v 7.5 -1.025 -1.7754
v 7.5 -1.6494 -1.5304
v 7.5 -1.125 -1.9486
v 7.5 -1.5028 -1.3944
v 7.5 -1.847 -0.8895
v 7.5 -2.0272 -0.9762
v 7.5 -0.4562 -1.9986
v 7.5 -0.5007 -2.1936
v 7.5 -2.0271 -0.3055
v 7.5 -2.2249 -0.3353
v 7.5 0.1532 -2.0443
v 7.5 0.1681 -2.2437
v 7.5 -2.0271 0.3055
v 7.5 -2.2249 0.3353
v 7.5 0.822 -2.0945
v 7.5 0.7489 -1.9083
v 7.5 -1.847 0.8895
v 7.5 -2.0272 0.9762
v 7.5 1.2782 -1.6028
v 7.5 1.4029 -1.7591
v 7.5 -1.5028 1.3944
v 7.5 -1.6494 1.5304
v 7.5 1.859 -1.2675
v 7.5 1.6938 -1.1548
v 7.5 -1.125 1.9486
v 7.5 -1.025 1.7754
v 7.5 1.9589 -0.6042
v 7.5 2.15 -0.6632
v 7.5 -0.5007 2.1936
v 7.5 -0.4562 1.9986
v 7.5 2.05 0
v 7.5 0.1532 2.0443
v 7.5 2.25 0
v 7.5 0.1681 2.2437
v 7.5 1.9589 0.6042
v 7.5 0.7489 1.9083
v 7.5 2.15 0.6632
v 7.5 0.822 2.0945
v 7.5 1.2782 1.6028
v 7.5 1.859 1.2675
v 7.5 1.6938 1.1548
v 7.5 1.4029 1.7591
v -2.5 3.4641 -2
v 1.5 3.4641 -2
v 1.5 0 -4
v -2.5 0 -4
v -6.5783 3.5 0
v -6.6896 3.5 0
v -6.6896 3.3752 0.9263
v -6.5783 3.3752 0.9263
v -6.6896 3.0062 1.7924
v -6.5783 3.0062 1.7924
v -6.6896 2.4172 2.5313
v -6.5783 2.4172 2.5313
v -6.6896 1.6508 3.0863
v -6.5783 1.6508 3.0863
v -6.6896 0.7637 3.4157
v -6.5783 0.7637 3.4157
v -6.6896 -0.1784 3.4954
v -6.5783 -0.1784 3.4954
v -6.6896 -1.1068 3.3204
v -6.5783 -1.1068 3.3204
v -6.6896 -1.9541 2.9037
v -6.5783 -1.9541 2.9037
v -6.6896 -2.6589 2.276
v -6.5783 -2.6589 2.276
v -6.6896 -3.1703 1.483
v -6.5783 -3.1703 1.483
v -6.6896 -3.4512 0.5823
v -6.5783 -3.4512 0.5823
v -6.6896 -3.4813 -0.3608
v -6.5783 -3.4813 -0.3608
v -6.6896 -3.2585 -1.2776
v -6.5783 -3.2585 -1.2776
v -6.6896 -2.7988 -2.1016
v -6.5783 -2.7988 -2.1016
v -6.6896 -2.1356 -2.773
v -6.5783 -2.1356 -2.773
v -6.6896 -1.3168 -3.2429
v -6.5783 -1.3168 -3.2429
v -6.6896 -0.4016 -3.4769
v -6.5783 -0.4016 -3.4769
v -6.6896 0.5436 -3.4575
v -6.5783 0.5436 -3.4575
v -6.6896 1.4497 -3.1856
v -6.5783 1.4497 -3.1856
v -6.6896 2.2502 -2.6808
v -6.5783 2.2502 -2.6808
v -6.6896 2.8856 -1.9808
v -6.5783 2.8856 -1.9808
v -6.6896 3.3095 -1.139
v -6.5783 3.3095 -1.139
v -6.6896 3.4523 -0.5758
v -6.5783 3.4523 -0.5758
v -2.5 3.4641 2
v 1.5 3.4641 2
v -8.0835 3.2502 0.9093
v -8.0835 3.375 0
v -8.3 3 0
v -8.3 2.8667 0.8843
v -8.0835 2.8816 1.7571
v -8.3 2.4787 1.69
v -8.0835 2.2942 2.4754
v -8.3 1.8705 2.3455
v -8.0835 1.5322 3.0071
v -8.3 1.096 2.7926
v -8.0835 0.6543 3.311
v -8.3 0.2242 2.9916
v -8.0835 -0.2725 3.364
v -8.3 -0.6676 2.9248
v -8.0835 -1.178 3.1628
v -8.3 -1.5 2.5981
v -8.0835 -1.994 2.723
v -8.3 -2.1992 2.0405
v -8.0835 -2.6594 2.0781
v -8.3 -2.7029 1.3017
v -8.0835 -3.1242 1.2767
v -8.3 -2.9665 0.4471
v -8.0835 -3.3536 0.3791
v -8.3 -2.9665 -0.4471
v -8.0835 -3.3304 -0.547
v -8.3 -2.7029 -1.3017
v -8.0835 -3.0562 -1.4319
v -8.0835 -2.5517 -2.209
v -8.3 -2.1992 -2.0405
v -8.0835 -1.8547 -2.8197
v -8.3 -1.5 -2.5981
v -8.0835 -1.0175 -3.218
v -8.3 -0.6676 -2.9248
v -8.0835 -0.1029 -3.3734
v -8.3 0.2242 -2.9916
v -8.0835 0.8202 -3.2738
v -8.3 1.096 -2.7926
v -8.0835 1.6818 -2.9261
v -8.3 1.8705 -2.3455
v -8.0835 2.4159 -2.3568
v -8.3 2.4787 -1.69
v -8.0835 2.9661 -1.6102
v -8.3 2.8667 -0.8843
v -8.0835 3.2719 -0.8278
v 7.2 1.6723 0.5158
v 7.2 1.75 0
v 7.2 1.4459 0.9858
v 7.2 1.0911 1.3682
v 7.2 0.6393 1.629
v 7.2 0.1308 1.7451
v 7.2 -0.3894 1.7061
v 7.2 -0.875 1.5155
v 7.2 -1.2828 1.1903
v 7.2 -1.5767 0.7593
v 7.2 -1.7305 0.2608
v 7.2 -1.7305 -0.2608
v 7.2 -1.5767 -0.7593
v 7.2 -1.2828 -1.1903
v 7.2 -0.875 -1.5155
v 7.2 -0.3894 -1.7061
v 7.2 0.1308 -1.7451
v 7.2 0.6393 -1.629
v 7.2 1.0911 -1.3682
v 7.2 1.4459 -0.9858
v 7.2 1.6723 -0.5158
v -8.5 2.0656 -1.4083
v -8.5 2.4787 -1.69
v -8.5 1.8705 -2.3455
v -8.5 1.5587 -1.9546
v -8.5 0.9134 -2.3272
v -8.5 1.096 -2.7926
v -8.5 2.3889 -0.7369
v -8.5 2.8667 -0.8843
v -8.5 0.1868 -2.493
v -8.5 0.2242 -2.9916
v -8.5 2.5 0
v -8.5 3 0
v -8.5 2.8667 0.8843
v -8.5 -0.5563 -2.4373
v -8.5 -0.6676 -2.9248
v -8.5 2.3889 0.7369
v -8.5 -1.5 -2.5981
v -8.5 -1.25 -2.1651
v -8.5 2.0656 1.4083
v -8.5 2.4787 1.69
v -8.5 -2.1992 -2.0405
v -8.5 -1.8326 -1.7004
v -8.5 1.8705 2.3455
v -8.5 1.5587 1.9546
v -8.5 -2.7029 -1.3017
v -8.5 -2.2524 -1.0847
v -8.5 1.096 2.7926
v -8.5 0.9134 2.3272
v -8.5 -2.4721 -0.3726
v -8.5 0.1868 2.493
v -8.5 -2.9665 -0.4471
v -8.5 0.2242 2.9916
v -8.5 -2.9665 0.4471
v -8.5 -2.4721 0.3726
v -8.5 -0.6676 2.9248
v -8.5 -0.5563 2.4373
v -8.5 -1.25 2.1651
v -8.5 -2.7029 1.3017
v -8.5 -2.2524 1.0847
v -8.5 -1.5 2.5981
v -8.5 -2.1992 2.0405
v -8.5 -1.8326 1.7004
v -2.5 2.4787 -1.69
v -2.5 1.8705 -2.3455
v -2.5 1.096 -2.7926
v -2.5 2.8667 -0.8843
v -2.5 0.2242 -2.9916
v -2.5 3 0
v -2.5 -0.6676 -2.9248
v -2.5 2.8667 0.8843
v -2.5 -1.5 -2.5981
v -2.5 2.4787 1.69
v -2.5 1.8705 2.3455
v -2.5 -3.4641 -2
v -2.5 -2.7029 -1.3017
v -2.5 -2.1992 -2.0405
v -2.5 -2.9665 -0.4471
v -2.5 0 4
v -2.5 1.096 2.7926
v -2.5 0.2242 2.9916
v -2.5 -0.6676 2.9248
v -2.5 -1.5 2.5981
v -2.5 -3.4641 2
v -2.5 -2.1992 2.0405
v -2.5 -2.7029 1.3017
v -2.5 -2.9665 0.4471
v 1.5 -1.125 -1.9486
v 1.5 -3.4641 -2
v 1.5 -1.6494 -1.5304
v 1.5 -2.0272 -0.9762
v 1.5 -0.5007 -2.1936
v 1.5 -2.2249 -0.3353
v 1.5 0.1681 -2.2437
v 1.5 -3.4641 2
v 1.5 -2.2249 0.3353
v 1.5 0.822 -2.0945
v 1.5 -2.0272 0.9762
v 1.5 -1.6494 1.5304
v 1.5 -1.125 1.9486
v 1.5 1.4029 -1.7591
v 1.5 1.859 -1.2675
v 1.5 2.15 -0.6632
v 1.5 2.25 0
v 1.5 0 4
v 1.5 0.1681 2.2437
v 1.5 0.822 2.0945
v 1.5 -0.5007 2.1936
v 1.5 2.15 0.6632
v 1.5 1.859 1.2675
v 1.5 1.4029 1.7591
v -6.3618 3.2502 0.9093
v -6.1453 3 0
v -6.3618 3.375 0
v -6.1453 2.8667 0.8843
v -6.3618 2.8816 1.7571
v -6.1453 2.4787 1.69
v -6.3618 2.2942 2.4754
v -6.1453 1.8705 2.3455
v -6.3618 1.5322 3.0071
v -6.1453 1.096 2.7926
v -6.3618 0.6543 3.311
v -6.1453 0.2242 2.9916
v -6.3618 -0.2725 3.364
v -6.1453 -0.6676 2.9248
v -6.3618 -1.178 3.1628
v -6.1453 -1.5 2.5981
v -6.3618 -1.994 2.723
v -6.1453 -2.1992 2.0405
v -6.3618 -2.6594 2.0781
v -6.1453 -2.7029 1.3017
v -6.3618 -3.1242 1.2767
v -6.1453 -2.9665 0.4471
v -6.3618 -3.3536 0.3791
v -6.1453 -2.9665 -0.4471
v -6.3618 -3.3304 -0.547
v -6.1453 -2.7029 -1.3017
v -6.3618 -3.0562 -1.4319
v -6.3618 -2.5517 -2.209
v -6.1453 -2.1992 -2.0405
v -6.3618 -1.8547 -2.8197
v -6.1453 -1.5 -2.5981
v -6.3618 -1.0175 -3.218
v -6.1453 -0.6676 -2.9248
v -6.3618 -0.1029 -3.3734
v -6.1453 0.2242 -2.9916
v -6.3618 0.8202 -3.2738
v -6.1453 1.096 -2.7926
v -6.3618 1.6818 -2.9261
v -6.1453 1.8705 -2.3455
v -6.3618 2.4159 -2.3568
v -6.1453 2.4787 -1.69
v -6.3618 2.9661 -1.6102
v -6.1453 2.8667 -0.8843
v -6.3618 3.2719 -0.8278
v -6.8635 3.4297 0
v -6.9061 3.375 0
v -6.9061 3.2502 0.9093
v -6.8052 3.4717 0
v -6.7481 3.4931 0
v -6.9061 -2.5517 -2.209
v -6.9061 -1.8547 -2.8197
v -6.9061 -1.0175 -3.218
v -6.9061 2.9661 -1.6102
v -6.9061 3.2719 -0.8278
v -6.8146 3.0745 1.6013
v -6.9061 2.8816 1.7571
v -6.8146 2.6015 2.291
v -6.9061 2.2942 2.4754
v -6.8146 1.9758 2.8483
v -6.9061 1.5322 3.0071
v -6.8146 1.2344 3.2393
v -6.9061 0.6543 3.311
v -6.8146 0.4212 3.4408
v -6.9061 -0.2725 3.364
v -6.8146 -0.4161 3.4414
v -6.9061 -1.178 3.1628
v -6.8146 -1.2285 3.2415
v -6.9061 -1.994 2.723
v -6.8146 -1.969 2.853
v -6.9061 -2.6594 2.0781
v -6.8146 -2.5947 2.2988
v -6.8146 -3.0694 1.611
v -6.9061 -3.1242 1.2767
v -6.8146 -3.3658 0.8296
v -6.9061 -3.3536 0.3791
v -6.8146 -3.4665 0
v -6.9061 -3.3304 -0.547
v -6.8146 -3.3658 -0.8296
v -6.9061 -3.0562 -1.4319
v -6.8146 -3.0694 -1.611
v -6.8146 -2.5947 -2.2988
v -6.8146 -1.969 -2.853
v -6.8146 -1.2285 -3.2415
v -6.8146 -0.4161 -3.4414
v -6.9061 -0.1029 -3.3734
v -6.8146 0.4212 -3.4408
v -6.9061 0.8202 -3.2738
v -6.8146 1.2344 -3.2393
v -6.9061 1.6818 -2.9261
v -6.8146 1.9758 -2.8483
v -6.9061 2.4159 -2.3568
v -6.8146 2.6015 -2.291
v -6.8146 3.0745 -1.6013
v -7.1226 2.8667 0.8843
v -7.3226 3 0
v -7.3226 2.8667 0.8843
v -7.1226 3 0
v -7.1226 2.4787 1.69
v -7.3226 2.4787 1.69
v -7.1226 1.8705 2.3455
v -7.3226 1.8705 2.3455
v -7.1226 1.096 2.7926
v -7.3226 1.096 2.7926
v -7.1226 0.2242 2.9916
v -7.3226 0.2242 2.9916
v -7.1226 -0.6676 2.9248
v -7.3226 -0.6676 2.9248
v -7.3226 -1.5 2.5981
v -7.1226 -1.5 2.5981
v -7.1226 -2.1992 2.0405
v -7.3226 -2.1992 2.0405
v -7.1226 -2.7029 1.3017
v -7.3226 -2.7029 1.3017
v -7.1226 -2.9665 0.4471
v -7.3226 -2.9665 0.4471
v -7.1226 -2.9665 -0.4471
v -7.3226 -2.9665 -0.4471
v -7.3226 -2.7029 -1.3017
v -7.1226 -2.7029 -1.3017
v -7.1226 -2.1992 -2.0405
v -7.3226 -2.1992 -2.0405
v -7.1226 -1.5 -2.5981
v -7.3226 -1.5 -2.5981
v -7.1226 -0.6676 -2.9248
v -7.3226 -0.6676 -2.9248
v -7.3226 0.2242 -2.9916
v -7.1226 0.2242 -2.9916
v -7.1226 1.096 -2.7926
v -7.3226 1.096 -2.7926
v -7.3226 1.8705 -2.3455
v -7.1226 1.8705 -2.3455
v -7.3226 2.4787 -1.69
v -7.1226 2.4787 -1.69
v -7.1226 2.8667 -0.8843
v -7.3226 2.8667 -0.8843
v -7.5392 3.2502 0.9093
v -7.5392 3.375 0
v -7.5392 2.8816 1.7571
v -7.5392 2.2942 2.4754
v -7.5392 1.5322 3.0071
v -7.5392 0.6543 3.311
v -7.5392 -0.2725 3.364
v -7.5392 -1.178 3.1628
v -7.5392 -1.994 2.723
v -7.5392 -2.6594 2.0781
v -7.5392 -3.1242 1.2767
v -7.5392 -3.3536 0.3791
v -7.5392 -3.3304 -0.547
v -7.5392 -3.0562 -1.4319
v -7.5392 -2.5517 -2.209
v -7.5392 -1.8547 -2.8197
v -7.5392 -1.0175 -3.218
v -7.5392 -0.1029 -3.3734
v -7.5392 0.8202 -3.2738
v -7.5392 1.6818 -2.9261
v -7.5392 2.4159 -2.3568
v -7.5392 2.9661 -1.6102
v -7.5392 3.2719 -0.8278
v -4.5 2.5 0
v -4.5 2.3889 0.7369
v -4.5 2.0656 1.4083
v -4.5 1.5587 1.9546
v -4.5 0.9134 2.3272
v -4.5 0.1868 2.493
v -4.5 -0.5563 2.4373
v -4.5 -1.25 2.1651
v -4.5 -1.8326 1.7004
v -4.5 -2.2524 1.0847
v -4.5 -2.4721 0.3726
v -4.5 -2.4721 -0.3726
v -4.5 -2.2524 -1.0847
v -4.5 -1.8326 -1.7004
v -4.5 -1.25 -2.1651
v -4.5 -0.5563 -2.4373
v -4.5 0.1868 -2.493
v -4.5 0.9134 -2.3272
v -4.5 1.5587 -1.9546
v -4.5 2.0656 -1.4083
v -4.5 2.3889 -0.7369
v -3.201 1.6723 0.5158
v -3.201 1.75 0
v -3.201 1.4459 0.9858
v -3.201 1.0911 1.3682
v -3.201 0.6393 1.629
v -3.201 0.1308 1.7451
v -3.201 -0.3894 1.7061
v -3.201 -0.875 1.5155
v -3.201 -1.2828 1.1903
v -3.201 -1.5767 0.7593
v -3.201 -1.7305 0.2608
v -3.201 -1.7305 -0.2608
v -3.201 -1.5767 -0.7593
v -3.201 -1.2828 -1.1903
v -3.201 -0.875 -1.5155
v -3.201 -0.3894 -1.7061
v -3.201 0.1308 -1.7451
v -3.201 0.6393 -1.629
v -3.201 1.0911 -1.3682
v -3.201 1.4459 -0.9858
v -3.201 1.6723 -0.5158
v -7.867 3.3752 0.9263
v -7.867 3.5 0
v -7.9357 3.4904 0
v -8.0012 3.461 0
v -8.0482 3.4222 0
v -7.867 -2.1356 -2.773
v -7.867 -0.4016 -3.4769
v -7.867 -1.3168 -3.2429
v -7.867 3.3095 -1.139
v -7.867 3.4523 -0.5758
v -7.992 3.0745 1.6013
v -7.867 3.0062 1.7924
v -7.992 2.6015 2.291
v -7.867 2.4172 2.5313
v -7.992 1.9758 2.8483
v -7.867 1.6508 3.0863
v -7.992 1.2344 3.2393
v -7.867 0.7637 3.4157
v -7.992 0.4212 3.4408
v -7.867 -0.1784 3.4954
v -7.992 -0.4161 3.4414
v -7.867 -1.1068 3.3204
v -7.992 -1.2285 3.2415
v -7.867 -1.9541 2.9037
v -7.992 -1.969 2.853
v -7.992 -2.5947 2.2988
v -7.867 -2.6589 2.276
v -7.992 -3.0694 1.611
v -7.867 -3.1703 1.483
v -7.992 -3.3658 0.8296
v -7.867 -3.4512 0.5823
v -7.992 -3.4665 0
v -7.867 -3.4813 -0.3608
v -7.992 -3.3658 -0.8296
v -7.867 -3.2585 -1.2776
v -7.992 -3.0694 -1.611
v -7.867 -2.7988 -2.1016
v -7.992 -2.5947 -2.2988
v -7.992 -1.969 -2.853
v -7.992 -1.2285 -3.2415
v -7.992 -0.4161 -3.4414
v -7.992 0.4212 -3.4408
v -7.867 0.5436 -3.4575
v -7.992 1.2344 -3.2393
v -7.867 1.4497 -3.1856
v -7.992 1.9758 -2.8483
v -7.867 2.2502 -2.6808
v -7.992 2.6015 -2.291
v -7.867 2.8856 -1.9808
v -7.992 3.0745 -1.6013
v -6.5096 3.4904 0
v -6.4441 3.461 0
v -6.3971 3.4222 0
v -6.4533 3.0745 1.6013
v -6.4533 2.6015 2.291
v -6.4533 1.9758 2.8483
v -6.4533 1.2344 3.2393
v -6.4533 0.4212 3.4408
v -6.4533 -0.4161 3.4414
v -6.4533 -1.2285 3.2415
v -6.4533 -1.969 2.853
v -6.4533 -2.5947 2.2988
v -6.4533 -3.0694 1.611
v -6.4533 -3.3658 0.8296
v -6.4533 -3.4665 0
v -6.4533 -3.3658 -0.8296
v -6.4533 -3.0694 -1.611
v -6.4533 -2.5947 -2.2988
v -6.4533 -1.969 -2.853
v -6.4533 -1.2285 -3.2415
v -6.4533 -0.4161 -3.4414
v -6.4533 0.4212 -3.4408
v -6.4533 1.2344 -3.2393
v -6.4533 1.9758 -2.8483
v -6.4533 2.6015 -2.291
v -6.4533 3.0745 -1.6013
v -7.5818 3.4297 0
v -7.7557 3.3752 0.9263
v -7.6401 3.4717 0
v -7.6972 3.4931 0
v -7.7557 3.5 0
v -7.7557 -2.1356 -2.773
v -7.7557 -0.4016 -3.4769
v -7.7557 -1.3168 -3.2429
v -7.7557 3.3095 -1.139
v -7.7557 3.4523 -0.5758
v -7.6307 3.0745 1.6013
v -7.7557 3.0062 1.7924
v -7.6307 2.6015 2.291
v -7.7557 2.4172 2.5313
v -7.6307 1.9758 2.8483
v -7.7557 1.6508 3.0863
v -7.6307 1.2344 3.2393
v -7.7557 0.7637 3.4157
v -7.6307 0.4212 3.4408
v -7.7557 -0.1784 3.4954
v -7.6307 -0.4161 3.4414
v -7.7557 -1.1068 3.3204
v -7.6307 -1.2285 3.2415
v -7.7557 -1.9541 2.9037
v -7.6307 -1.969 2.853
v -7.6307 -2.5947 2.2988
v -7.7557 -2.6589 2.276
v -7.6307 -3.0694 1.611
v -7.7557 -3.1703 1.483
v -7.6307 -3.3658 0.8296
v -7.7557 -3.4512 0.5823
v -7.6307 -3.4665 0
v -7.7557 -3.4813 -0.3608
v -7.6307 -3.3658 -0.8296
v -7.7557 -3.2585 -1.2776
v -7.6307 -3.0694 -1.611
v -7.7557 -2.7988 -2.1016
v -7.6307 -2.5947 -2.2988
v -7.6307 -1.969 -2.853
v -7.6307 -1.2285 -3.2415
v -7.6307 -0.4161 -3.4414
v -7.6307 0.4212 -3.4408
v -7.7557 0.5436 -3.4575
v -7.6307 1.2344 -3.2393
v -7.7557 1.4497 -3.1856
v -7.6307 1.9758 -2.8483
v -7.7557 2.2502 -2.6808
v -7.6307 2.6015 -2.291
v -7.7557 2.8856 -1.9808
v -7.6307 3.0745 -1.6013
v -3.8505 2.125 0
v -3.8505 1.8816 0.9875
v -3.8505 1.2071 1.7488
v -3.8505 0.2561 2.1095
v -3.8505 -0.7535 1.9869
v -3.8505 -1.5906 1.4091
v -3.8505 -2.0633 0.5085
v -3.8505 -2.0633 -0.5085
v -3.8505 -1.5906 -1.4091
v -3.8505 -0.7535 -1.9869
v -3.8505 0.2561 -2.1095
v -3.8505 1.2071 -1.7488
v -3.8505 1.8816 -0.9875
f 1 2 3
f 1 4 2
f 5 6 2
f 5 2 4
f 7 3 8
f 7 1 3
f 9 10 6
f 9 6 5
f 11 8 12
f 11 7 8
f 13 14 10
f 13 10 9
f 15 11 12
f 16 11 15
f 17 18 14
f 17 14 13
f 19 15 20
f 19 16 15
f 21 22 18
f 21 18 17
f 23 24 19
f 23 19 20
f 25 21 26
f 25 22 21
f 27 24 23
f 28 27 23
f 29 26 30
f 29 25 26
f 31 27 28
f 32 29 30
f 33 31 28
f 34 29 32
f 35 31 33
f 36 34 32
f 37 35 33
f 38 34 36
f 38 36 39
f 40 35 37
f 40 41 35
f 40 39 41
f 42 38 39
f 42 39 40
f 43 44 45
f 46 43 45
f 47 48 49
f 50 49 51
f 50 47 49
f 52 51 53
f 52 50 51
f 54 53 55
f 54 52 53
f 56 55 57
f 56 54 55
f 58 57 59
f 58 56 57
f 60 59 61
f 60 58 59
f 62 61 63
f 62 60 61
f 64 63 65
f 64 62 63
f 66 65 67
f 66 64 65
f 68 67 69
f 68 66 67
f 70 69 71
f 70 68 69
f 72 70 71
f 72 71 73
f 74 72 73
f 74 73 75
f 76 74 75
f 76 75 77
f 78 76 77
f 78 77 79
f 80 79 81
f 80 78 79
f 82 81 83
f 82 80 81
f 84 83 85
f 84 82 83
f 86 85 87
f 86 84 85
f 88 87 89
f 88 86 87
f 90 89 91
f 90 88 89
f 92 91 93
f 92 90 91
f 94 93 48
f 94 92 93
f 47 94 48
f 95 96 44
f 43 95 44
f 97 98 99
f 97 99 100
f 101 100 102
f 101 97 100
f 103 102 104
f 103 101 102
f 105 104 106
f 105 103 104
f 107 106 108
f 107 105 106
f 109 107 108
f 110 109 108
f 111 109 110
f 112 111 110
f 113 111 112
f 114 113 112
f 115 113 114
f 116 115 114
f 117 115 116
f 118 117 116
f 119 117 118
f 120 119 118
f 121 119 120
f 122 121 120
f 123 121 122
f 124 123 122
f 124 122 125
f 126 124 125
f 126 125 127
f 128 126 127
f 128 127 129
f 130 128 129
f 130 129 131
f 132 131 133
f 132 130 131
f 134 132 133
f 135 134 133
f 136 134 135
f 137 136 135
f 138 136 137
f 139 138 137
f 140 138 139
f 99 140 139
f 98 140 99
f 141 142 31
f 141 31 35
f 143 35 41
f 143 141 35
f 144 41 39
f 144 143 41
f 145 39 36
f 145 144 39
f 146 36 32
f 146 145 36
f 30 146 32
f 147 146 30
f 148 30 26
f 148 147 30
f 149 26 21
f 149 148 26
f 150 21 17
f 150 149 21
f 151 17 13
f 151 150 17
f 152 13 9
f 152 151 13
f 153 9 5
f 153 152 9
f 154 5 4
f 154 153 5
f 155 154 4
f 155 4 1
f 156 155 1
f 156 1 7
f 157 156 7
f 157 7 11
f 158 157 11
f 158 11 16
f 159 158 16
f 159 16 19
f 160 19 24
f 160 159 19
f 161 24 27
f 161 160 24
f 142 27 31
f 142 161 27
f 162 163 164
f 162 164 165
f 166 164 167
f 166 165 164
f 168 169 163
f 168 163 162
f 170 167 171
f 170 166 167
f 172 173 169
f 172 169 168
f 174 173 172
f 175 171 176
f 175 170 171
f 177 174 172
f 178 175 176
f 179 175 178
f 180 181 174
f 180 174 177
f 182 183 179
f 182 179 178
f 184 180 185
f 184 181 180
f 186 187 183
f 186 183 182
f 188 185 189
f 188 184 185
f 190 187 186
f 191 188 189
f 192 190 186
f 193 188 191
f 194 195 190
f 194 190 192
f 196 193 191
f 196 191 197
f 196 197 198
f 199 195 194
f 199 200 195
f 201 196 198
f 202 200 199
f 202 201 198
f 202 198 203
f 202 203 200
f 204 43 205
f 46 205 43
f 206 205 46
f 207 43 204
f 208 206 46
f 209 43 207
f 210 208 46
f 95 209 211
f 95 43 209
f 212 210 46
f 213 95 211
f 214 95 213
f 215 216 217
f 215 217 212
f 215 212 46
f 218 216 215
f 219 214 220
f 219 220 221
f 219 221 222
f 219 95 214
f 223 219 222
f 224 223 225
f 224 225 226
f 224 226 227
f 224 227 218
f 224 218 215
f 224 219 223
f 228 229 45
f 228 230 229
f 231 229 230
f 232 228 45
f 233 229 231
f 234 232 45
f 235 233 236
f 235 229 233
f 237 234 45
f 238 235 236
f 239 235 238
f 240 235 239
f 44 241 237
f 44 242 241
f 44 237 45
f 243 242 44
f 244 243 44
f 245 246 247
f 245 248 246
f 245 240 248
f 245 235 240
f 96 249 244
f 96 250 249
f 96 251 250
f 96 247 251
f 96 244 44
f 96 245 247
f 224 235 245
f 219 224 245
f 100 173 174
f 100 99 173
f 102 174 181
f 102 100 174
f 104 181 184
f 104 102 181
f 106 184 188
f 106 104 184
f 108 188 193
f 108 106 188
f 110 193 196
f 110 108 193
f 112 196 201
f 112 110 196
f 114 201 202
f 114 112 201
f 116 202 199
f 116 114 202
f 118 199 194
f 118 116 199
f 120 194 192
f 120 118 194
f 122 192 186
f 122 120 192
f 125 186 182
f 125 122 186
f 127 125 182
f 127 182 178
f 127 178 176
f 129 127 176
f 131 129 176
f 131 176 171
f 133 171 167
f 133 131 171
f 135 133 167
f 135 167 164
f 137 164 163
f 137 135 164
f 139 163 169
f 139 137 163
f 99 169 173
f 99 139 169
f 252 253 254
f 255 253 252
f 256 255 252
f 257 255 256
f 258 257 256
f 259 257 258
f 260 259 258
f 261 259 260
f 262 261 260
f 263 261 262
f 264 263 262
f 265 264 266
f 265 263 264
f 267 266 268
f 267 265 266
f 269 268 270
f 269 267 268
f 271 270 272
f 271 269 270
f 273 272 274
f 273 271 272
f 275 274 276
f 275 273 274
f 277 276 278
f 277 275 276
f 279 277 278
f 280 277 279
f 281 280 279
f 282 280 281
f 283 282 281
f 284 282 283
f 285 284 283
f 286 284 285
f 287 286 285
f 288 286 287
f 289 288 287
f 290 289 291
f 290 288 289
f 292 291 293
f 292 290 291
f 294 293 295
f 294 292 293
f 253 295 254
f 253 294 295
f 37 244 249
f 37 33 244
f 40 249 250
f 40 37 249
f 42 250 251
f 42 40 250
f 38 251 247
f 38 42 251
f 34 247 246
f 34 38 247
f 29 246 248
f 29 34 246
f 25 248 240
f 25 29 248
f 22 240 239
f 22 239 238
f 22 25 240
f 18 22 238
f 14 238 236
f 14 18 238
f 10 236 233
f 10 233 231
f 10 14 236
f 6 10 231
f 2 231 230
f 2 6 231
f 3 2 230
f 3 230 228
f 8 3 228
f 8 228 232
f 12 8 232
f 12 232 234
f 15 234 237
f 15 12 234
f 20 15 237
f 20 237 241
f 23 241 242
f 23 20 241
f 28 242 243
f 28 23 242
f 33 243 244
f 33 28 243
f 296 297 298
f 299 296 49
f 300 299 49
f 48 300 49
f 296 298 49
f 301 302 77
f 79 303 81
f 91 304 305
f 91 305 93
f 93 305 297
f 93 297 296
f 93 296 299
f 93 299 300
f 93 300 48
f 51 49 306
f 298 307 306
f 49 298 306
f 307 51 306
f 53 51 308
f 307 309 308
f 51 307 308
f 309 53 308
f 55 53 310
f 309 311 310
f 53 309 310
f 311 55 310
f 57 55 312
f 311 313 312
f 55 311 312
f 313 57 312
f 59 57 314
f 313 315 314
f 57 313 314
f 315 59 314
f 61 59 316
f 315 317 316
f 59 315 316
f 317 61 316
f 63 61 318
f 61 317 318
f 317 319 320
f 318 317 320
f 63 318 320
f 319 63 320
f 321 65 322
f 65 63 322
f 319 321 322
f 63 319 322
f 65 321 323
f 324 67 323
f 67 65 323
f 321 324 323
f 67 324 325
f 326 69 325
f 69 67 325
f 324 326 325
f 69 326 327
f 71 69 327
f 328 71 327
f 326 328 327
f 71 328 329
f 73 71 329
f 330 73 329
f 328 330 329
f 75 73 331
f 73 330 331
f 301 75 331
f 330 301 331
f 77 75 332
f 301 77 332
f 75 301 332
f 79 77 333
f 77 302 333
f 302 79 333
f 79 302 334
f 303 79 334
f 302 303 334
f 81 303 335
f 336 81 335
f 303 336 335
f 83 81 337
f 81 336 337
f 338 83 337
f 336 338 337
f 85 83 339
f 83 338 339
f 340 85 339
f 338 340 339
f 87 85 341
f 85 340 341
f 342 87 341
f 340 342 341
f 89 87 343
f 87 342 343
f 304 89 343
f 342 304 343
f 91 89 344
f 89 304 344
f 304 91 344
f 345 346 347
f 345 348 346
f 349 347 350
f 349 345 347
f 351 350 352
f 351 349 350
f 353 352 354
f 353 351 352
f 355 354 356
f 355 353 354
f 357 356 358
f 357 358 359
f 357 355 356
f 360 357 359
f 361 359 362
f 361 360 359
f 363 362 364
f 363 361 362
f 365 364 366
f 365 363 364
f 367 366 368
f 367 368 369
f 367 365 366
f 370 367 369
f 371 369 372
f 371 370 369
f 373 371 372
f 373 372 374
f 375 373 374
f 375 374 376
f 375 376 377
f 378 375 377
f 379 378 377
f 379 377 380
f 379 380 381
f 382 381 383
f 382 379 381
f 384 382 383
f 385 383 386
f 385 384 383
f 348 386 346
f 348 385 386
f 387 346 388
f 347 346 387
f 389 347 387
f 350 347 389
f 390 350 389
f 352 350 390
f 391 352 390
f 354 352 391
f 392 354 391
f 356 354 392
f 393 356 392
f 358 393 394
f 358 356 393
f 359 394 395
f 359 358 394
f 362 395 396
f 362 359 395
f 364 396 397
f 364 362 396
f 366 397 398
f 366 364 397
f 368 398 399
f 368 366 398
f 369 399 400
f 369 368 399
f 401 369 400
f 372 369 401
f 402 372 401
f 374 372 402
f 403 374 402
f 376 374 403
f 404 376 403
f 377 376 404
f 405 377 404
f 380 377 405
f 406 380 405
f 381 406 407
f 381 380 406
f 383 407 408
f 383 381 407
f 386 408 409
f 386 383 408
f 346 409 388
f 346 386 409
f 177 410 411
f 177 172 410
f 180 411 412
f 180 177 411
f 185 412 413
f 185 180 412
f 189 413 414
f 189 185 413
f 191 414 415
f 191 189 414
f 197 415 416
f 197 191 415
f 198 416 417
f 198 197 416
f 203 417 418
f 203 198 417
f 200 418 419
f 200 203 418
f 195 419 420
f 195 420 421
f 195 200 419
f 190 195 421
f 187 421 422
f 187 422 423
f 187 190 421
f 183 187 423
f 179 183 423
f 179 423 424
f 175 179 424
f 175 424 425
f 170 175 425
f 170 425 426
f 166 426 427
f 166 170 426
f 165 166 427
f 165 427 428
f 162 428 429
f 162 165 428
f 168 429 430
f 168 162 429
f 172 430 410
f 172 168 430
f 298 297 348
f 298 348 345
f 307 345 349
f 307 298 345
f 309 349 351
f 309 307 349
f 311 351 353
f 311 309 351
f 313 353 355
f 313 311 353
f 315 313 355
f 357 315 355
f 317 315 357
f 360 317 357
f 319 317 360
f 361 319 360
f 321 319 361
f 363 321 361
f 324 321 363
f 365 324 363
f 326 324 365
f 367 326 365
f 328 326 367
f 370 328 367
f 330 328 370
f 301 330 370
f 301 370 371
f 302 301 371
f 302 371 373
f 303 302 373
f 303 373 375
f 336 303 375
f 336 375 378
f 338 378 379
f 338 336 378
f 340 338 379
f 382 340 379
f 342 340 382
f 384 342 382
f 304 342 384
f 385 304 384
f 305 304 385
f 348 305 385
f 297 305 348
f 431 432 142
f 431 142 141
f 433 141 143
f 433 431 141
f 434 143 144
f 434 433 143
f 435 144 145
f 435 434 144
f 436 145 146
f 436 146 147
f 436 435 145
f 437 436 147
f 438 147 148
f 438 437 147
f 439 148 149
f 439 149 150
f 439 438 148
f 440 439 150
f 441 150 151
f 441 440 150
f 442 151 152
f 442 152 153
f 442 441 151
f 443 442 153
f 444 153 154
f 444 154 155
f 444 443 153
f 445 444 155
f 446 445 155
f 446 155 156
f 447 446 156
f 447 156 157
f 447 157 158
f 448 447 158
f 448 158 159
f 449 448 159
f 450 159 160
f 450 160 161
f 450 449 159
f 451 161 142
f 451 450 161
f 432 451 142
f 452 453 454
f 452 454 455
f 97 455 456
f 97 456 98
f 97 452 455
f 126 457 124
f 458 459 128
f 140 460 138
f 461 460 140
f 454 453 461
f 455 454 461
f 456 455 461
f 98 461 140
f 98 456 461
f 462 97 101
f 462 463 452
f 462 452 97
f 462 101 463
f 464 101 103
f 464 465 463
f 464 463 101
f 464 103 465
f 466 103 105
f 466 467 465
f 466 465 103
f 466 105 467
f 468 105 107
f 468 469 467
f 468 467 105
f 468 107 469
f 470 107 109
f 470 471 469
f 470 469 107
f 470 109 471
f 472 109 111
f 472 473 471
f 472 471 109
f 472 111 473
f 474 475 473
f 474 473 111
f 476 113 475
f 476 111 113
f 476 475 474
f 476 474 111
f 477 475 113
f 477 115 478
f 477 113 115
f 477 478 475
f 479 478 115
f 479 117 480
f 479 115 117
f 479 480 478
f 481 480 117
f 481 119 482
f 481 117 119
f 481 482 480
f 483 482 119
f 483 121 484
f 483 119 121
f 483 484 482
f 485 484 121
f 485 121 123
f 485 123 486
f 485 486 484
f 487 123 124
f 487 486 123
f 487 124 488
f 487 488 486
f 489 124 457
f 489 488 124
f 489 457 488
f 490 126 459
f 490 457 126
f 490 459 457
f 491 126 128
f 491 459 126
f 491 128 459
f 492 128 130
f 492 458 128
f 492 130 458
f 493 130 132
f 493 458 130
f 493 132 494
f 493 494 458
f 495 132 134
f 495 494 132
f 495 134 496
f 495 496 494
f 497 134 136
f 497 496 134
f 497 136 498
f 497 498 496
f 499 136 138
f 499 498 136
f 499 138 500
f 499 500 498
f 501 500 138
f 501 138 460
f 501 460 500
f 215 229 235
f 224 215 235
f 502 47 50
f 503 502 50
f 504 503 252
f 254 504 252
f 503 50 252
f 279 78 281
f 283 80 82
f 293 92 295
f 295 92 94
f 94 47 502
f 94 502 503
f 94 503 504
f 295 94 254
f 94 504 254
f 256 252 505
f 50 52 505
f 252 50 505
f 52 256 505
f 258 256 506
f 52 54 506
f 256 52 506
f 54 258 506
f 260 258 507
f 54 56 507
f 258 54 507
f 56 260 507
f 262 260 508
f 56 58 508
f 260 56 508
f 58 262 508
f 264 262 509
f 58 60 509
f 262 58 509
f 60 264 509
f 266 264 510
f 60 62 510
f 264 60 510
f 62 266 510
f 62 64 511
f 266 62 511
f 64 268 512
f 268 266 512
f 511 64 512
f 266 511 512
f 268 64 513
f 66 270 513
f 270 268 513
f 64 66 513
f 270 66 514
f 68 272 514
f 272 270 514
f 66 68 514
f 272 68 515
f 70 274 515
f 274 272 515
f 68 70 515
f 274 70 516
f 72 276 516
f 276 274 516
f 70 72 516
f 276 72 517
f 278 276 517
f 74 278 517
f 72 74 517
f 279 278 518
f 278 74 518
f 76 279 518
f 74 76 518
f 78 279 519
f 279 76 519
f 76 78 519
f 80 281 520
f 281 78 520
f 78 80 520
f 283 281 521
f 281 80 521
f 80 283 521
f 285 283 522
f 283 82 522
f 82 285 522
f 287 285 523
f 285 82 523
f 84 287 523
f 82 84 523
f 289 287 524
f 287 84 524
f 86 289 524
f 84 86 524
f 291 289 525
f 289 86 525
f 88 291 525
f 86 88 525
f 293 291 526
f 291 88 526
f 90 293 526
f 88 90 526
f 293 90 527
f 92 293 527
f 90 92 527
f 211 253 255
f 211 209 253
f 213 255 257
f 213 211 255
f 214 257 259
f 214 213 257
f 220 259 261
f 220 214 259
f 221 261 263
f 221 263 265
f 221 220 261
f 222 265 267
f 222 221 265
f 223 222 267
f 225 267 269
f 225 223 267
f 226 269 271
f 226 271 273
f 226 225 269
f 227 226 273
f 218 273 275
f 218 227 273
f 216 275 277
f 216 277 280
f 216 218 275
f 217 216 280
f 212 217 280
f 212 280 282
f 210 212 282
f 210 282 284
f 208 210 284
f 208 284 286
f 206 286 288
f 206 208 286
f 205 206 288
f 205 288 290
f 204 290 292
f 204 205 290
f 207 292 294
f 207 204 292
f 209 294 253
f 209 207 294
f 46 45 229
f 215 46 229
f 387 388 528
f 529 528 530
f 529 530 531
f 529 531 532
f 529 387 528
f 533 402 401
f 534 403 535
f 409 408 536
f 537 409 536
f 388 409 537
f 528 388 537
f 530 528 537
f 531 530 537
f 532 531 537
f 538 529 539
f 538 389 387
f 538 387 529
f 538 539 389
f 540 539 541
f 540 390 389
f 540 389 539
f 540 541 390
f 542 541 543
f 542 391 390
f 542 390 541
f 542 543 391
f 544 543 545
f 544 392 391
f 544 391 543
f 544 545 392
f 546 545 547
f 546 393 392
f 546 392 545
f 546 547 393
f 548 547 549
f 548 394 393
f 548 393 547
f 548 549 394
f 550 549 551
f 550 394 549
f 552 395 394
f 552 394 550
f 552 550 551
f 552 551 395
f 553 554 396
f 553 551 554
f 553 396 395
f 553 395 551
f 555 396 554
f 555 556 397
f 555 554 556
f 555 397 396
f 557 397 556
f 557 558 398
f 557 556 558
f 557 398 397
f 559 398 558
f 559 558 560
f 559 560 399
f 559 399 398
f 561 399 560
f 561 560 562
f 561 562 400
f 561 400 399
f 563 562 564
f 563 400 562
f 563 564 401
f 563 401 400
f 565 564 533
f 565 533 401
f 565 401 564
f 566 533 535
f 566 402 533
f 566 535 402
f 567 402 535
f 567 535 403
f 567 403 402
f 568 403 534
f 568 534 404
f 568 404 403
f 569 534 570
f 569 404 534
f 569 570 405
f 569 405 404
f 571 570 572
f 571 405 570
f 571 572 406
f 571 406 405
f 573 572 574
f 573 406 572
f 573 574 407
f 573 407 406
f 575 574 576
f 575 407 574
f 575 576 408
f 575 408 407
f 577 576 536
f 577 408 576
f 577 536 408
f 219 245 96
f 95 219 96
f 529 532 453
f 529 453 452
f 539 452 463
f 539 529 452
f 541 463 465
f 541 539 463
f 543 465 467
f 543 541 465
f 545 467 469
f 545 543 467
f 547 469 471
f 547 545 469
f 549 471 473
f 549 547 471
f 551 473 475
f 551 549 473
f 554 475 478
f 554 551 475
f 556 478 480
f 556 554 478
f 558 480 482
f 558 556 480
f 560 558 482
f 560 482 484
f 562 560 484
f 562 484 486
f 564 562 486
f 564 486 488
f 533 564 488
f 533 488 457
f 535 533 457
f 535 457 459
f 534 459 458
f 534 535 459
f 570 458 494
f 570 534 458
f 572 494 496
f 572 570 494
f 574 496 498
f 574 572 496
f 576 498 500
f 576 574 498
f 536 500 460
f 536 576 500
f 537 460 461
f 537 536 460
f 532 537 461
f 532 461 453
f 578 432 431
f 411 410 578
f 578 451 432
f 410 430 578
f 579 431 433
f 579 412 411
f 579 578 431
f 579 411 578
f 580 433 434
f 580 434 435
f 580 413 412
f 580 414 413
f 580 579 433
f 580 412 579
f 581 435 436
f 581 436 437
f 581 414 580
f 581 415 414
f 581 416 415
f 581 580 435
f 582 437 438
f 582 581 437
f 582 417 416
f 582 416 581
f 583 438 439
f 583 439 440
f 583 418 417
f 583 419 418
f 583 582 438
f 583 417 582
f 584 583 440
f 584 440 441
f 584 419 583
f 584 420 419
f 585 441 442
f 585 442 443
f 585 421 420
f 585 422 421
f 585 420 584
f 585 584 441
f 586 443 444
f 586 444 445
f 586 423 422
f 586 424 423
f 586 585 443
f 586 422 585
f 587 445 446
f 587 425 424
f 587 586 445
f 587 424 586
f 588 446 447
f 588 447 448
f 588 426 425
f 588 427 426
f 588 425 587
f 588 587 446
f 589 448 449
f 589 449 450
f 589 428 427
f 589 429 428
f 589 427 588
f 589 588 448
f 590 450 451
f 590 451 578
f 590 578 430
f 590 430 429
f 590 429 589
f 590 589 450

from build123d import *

# Parameters (mm, degrees)
CORTE_EXTRUS_O1_DEPTH = 4
FILETE1_R             = 0.25
FILETE2_R             = 0.25
CHANFRO1_SIZE         = 0.3


with BuildPart() as part:
    # Esboço1 → Revolução1 (revolve)
    with BuildSketch(Plane.XY):
        Polygon((-7.322649731, 3), (-7.122649731, 3), (-6.833974596, 3.5), (-6.433974596, 3.5), (-6.145299462, 3), (-2.5, 3), (-2.5, 4), (1.5, 4), (1.5, 2.25), (7.5, 2.25), (7.5, 1.75), (-3.200961894, 1.75), (-4.5, 2.5), (-8.5, 2.5), (-8.5, 3), (-8.3, 3), (-8.011324865, 3.5), (-7.611324865, 3.5), align=None)
    revolve(axis=Axis((-29.721905334, 0, 0), (1, 0, 0)))

    # Esboço2 → Corte-extrusão1 (cut)
    with BuildSketch(Plane(origin=(1.5, 0, 0), x_dir=(0, 0, -1), z_dir=(1, 0, 0))):
        with BuildLine():
            Line((-2, 3.464101615), (2, 3.464101615))
            ThreePointArc((2, 3.464101615), (0, 4), (-2, 3.464101615))
        make_face()
        with BuildLine():
            Line((-4, 0), (-2, 3.464101615))
            ThreePointArc((-2, 3.464101615), (-3.464101615, 2), (-4, 0))
        make_face()
        with BuildLine():
            ThreePointArc((-4, 0), (-3.464101615, -2), (-2, -3.464101615))
            Line((-2, -3.464101615), (-4, 0))
        make_face()
        with BuildLine():
            ThreePointArc((-2, -3.464101615), (0, -4), (2, -3.464101615))
            Line((2, -3.464101615), (-2, -3.464101615))
        make_face()
        with BuildLine():
            ThreePointArc((2, -3.464101615), (3.464101615, -2), (4, 0))
            Line((4, 0), (2, -3.464101615))
        make_face()
        with BuildLine():
            Line((2, 3.464101615), (4, 0))
            ThreePointArc((4, 0), (3.464101615, 2), (2, 3.464101615))
        make_face()
    extrude(amount=-CORTE_EXTRUS_O1_DEPTH, mode=Mode.SUBTRACT)

    # Filete1
    filete1_edges = [part.edges().sort_by_distance(p)[0] for p in [
        (-8.011324865, -3.5, 0),
        (-7.611324865, -3.5, 0),
    ]]
    fillet(filete1_edges, radius=FILETE1_R)

    # Filete2
    filete2_edges = [part.edges().sort_by_distance(p)[0] for p in [
        (-6.833974596, -3.5, 0),
        (-6.433974596, -3.5, 0),
    ]]
    fillet(filete2_edges, radius=FILETE2_R)

    # Chanfro1
    chanfro1_edges = [part.edges().sort_by_distance(p)[0] for p in [
        (7.5, -1.75, 0),
    ]]
    chamfer(chanfro1_edges, length=CHANFRO1_SIZE)


solid = part.part
